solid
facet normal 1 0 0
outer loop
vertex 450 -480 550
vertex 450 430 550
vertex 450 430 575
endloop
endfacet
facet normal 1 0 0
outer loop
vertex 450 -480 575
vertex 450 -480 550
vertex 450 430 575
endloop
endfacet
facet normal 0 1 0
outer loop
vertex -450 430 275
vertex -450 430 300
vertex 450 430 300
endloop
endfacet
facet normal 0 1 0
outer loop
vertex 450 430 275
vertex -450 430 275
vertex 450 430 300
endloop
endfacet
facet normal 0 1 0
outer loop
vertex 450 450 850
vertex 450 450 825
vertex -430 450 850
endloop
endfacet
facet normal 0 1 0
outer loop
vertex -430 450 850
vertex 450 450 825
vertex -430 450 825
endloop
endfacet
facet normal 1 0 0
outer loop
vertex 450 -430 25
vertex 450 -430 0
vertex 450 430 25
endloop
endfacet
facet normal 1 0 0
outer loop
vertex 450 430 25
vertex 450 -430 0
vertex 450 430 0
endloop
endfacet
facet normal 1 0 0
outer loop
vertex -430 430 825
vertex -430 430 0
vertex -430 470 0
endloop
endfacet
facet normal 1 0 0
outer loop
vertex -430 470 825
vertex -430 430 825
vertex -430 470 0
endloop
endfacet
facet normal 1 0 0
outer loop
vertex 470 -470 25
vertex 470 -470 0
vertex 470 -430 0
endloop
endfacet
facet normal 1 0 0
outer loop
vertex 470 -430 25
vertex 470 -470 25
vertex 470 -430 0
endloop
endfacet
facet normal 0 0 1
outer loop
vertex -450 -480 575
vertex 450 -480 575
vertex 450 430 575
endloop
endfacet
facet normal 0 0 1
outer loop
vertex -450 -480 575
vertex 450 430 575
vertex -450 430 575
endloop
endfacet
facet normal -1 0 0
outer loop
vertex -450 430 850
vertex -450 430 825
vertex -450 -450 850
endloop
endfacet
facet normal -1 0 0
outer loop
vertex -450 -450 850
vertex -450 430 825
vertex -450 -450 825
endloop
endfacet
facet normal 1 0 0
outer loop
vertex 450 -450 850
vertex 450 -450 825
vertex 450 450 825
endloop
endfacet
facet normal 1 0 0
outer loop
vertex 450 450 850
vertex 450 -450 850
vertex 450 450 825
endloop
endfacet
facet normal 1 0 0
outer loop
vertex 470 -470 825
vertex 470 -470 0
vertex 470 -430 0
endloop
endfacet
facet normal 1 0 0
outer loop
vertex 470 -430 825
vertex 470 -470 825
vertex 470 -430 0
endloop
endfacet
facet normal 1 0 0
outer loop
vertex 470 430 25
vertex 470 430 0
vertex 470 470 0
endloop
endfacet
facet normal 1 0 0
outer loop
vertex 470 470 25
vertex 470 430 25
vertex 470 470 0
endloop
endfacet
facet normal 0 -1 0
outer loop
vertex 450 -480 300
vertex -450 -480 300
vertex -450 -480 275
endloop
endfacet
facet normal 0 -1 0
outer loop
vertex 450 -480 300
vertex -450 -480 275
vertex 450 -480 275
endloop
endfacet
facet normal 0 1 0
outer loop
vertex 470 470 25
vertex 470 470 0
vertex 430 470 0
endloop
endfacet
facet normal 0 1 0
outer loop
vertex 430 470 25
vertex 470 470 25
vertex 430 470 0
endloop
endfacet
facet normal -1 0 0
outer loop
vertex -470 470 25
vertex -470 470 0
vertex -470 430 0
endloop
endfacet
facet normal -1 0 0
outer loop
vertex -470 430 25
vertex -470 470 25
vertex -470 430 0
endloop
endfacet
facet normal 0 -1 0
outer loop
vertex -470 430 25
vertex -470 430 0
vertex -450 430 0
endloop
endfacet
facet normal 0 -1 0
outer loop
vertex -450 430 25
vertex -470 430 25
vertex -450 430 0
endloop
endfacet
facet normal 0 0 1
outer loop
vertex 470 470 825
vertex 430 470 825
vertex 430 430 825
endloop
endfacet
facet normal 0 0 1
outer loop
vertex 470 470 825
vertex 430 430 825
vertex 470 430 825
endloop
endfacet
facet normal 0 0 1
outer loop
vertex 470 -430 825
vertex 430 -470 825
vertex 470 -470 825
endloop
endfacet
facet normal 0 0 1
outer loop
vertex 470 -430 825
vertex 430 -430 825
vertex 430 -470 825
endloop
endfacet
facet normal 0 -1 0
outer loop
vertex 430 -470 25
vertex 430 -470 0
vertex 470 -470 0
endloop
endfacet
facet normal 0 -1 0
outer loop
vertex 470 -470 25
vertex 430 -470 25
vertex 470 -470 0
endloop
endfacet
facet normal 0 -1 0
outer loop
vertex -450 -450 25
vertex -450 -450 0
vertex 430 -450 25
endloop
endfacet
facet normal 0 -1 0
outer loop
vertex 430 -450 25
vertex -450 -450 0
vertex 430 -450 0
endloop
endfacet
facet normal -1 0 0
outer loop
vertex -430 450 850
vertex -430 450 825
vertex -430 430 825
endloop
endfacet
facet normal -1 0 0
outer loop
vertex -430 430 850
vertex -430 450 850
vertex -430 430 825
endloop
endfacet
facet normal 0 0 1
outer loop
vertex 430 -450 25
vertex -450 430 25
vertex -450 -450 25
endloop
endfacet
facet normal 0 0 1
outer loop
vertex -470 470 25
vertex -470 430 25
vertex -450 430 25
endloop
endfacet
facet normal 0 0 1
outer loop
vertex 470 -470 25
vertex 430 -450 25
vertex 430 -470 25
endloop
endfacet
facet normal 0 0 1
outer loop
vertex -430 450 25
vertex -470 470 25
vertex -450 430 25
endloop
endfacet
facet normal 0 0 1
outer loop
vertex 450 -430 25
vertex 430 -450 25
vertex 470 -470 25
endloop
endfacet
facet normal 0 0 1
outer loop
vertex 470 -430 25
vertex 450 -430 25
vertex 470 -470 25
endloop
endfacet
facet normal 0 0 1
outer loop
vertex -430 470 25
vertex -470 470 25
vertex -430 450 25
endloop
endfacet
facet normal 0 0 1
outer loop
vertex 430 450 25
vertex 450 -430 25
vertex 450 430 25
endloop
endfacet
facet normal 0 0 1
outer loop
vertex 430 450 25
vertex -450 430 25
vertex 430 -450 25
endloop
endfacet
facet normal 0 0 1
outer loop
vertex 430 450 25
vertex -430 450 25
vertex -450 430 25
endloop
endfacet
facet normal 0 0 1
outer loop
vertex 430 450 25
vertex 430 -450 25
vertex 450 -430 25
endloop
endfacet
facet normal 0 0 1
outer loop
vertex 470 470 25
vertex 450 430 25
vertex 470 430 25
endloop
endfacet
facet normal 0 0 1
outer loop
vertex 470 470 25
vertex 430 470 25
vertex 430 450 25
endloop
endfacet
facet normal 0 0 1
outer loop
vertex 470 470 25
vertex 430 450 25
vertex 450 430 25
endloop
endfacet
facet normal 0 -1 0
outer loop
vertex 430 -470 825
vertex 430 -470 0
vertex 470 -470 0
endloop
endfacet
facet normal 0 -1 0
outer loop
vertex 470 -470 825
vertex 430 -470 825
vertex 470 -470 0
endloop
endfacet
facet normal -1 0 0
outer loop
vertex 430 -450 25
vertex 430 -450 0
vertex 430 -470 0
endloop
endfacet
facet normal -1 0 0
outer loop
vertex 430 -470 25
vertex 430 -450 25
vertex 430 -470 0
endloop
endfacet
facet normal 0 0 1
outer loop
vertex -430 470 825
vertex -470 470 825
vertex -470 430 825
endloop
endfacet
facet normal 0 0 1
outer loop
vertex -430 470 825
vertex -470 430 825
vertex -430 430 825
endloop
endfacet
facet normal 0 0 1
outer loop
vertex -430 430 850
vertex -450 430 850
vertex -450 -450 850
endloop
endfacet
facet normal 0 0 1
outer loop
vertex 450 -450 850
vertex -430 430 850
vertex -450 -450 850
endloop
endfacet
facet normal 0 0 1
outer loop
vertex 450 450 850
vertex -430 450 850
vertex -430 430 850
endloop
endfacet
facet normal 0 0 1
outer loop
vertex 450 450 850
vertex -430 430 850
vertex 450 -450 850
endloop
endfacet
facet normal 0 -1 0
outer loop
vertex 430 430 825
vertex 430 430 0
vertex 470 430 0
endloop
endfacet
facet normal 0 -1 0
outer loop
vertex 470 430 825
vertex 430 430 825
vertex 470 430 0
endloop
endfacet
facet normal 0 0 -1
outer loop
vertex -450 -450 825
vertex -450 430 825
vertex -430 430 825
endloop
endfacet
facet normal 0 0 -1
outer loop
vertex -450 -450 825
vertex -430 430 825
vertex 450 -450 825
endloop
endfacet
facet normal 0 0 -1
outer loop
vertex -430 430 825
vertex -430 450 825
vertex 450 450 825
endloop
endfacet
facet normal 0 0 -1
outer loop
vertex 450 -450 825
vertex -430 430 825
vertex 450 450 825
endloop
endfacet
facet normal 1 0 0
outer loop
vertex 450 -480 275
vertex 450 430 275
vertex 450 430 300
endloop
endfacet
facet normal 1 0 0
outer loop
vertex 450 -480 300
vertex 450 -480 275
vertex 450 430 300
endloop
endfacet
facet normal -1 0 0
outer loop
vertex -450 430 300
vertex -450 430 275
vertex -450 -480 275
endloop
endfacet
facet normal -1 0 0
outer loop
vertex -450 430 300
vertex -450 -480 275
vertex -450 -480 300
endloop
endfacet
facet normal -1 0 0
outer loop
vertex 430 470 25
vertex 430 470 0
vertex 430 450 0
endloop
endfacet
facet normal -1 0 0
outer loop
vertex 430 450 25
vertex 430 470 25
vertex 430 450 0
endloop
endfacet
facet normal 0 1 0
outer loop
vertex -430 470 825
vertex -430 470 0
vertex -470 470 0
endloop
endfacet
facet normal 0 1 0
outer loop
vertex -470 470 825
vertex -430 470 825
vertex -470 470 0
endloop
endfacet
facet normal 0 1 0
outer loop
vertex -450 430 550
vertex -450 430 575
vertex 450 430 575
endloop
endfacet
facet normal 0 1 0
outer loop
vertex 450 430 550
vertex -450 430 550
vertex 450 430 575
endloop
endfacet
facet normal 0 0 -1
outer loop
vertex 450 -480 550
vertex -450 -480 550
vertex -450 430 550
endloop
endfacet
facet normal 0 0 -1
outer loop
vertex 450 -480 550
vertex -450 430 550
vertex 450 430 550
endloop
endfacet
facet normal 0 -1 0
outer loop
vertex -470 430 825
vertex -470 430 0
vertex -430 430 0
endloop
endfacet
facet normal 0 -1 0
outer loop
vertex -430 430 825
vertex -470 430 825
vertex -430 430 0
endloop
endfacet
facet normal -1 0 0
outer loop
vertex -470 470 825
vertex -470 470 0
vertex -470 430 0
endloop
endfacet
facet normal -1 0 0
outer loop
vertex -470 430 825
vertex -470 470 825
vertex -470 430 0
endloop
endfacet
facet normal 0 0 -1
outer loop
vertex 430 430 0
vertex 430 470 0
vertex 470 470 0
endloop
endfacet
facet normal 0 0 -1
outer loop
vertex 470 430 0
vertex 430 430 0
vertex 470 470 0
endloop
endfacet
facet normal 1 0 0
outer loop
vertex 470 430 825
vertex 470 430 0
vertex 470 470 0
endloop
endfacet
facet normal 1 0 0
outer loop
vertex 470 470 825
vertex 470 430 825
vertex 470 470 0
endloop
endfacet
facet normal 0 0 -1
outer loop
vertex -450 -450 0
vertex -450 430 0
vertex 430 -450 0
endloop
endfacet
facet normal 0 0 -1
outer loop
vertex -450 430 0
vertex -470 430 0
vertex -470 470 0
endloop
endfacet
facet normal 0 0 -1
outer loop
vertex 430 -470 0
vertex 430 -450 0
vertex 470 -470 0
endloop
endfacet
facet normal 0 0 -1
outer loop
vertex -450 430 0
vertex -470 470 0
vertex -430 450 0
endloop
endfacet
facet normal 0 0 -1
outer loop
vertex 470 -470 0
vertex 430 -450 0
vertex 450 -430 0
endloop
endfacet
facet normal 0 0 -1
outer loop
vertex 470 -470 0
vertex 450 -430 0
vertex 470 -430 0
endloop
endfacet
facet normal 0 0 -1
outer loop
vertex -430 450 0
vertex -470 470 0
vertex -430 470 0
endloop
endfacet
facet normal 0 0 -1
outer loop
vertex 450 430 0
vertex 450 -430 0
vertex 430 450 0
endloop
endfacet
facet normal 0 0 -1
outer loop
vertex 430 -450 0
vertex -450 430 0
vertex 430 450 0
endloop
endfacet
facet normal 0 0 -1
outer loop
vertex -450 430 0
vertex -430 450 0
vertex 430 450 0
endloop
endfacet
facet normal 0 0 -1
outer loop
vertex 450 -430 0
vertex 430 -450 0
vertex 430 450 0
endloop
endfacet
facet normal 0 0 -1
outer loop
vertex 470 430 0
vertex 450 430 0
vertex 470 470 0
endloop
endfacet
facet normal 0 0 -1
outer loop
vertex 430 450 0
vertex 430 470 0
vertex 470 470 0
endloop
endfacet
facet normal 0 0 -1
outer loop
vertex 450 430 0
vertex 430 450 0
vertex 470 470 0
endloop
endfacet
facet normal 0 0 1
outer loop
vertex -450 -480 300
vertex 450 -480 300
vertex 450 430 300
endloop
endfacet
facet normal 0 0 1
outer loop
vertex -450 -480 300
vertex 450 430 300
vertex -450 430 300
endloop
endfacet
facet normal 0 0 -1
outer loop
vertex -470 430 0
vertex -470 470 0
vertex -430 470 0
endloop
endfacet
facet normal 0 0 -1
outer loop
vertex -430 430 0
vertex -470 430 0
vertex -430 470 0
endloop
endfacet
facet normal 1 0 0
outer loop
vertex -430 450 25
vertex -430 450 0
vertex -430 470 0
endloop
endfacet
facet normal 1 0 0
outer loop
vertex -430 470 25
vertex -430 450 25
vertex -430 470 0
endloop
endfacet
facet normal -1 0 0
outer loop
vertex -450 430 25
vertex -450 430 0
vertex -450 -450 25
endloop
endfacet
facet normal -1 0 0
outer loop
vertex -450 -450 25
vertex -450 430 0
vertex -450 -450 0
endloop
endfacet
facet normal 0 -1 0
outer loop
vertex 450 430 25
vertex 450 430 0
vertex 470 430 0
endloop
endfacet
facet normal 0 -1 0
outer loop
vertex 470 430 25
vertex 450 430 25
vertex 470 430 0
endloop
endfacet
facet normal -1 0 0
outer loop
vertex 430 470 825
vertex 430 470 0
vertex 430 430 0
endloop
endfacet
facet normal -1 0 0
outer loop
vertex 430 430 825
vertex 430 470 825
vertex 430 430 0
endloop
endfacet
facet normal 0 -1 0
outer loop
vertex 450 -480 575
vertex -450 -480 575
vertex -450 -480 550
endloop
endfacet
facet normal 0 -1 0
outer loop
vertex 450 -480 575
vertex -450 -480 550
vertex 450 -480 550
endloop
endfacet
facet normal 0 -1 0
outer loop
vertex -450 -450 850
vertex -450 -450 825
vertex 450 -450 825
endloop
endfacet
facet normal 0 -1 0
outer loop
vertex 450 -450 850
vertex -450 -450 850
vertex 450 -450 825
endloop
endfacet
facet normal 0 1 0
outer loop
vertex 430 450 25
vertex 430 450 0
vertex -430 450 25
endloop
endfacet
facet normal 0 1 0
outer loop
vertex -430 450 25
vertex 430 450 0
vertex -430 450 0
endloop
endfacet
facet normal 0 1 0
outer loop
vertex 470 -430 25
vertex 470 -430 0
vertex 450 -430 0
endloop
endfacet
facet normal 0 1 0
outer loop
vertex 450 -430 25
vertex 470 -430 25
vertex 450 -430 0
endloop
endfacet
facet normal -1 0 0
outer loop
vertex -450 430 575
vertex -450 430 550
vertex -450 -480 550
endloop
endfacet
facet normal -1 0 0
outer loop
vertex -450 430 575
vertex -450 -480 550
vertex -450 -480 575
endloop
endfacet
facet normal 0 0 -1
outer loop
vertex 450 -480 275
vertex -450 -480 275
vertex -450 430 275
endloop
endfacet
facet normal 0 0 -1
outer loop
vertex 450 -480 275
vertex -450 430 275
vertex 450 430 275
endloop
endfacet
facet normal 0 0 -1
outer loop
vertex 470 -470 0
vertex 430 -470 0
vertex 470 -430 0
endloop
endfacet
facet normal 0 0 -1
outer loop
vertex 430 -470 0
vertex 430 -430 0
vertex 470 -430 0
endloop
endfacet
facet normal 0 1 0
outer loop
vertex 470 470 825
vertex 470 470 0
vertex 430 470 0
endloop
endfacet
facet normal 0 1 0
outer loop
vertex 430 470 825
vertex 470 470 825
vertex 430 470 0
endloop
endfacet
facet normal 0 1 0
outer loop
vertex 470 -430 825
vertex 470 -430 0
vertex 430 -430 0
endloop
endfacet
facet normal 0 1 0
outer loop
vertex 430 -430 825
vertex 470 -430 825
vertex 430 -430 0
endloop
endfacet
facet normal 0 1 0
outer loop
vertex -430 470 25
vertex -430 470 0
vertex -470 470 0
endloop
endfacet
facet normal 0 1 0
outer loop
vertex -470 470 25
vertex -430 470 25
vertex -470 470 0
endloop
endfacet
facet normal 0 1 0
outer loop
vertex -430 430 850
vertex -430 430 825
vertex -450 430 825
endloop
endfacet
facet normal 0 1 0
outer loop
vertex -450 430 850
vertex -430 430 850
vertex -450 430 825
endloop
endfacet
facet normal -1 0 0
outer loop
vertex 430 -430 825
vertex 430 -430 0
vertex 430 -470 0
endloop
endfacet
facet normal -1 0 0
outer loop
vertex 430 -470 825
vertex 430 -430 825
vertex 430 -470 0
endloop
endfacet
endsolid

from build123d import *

# Parameters (mm, degrees)
F0_W     = 20
F0_H     = 20
F1_DEPTH = 825
F2_DEPTH = 25
F4_DEPTH = 25
F5_W     = 880
F5_H     = 25
F5_W_2   = 20
F6_DEPTH = 910


with BuildPart() as f1:
    # F0 (on Top) → F1 (new body)
    with BuildSketch(Plane.XY):
        Polygon((430, 470), (430, 450), (450, 450), (450, 430), (470, 430), (470, 470), align=None)
        with Locations((440, 440)):
            Rectangle(F0_W, F0_H)
    extrude(amount=F1_DEPTH)


with BuildPart() as f1b:
    # F0 (on Top) → F1, piece 2 (new body)
    with BuildSketch(Plane.XY):
        Polygon((-450, 430), (-450, 450), (-430, 450), (-430, 470), (-470, 470), (-470, 430), align=None)
        with Locations((-440, 440)):
            Rectangle(F0_W, F0_H)
    extrude(amount=F1_DEPTH)


with BuildPart() as f1c:
    # F0 (on Top) → F1, piece 3 (new body)
    with BuildSketch(Plane.XY):
        Polygon((450, -450), (430, -450), (430, -470), (470, -470), (470, -430), (450, -430), align=None)
        with Locations((440, -440)):
            Rectangle(F0_W, F0_H)
    extrude(amount=F1_DEPTH)


with BuildPart() as f2:
    # F0 (on Top) → F2 (new body)
    with BuildSketch(Plane.XY):
        Polygon((-450, 430), (-450, 450), (-430, 450), (-430, 470), (-470, 470), (-470, 430), align=None)
        with Locations((-440, 440)):
            Rectangle(F0_W, F0_H)
        Polygon((430, 450), (-430, 450), (-430, 430), (-450, 430), (-450, -450), (430, -450), (430, -430), (450, -430), (450, 430), (430, 430), align=None)
        Polygon((430, 470), (430, 450), (450, 450), (450, 430), (470, 430), (470, 470), align=None)
        with Locations((440, 440)):
            Rectangle(F0_W, F0_H)
        with Locations((440, -440)):
            Rectangle(F0_W, F0_H)
        Polygon((450, -450), (430, -450), (430, -470), (470, -470), (470, -430), (450, -430), align=None)
    extrude(amount=F2_DEPTH)


with BuildPart() as f4:
    # F3 (on face) → F4 (new body)
    with BuildSketch(Plane.XY.offset(825)):
        Polygon((450, 450), (-430, 450), (-430, 430), (-450, 430), (-450, -450), (450, -450), align=None)
    extrude(amount=F4_DEPTH)


with BuildPart() as f6:
    # F5 (on face) → F6 (new body)
    with BuildSketch(Plane.XZ.offset(-430)):
        with Locations((10, 562.5)):
            Rectangle(F5_W, F5_H)
        with Locations((-440, 562.5)):
            Rectangle(F5_W_2, F5_H)
    extrude(amount=F6_DEPTH)


with BuildPart() as f6b:
    # F5 (on face) → F6, piece 2 (new body)
    with BuildSketch(Plane.XZ.offset(-430)):
        with Locations((10, 287.5)):
            Rectangle(F5_W, F5_H)
        with Locations((-440, 287.5)):
            Rectangle(F5_W_2, F5_H)
    extrude(amount=F6_DEPTH)


solid = Compound([f1.part, f1b.part, f1c.part, f2.part, f4.part, f6.part, f6b.part])
